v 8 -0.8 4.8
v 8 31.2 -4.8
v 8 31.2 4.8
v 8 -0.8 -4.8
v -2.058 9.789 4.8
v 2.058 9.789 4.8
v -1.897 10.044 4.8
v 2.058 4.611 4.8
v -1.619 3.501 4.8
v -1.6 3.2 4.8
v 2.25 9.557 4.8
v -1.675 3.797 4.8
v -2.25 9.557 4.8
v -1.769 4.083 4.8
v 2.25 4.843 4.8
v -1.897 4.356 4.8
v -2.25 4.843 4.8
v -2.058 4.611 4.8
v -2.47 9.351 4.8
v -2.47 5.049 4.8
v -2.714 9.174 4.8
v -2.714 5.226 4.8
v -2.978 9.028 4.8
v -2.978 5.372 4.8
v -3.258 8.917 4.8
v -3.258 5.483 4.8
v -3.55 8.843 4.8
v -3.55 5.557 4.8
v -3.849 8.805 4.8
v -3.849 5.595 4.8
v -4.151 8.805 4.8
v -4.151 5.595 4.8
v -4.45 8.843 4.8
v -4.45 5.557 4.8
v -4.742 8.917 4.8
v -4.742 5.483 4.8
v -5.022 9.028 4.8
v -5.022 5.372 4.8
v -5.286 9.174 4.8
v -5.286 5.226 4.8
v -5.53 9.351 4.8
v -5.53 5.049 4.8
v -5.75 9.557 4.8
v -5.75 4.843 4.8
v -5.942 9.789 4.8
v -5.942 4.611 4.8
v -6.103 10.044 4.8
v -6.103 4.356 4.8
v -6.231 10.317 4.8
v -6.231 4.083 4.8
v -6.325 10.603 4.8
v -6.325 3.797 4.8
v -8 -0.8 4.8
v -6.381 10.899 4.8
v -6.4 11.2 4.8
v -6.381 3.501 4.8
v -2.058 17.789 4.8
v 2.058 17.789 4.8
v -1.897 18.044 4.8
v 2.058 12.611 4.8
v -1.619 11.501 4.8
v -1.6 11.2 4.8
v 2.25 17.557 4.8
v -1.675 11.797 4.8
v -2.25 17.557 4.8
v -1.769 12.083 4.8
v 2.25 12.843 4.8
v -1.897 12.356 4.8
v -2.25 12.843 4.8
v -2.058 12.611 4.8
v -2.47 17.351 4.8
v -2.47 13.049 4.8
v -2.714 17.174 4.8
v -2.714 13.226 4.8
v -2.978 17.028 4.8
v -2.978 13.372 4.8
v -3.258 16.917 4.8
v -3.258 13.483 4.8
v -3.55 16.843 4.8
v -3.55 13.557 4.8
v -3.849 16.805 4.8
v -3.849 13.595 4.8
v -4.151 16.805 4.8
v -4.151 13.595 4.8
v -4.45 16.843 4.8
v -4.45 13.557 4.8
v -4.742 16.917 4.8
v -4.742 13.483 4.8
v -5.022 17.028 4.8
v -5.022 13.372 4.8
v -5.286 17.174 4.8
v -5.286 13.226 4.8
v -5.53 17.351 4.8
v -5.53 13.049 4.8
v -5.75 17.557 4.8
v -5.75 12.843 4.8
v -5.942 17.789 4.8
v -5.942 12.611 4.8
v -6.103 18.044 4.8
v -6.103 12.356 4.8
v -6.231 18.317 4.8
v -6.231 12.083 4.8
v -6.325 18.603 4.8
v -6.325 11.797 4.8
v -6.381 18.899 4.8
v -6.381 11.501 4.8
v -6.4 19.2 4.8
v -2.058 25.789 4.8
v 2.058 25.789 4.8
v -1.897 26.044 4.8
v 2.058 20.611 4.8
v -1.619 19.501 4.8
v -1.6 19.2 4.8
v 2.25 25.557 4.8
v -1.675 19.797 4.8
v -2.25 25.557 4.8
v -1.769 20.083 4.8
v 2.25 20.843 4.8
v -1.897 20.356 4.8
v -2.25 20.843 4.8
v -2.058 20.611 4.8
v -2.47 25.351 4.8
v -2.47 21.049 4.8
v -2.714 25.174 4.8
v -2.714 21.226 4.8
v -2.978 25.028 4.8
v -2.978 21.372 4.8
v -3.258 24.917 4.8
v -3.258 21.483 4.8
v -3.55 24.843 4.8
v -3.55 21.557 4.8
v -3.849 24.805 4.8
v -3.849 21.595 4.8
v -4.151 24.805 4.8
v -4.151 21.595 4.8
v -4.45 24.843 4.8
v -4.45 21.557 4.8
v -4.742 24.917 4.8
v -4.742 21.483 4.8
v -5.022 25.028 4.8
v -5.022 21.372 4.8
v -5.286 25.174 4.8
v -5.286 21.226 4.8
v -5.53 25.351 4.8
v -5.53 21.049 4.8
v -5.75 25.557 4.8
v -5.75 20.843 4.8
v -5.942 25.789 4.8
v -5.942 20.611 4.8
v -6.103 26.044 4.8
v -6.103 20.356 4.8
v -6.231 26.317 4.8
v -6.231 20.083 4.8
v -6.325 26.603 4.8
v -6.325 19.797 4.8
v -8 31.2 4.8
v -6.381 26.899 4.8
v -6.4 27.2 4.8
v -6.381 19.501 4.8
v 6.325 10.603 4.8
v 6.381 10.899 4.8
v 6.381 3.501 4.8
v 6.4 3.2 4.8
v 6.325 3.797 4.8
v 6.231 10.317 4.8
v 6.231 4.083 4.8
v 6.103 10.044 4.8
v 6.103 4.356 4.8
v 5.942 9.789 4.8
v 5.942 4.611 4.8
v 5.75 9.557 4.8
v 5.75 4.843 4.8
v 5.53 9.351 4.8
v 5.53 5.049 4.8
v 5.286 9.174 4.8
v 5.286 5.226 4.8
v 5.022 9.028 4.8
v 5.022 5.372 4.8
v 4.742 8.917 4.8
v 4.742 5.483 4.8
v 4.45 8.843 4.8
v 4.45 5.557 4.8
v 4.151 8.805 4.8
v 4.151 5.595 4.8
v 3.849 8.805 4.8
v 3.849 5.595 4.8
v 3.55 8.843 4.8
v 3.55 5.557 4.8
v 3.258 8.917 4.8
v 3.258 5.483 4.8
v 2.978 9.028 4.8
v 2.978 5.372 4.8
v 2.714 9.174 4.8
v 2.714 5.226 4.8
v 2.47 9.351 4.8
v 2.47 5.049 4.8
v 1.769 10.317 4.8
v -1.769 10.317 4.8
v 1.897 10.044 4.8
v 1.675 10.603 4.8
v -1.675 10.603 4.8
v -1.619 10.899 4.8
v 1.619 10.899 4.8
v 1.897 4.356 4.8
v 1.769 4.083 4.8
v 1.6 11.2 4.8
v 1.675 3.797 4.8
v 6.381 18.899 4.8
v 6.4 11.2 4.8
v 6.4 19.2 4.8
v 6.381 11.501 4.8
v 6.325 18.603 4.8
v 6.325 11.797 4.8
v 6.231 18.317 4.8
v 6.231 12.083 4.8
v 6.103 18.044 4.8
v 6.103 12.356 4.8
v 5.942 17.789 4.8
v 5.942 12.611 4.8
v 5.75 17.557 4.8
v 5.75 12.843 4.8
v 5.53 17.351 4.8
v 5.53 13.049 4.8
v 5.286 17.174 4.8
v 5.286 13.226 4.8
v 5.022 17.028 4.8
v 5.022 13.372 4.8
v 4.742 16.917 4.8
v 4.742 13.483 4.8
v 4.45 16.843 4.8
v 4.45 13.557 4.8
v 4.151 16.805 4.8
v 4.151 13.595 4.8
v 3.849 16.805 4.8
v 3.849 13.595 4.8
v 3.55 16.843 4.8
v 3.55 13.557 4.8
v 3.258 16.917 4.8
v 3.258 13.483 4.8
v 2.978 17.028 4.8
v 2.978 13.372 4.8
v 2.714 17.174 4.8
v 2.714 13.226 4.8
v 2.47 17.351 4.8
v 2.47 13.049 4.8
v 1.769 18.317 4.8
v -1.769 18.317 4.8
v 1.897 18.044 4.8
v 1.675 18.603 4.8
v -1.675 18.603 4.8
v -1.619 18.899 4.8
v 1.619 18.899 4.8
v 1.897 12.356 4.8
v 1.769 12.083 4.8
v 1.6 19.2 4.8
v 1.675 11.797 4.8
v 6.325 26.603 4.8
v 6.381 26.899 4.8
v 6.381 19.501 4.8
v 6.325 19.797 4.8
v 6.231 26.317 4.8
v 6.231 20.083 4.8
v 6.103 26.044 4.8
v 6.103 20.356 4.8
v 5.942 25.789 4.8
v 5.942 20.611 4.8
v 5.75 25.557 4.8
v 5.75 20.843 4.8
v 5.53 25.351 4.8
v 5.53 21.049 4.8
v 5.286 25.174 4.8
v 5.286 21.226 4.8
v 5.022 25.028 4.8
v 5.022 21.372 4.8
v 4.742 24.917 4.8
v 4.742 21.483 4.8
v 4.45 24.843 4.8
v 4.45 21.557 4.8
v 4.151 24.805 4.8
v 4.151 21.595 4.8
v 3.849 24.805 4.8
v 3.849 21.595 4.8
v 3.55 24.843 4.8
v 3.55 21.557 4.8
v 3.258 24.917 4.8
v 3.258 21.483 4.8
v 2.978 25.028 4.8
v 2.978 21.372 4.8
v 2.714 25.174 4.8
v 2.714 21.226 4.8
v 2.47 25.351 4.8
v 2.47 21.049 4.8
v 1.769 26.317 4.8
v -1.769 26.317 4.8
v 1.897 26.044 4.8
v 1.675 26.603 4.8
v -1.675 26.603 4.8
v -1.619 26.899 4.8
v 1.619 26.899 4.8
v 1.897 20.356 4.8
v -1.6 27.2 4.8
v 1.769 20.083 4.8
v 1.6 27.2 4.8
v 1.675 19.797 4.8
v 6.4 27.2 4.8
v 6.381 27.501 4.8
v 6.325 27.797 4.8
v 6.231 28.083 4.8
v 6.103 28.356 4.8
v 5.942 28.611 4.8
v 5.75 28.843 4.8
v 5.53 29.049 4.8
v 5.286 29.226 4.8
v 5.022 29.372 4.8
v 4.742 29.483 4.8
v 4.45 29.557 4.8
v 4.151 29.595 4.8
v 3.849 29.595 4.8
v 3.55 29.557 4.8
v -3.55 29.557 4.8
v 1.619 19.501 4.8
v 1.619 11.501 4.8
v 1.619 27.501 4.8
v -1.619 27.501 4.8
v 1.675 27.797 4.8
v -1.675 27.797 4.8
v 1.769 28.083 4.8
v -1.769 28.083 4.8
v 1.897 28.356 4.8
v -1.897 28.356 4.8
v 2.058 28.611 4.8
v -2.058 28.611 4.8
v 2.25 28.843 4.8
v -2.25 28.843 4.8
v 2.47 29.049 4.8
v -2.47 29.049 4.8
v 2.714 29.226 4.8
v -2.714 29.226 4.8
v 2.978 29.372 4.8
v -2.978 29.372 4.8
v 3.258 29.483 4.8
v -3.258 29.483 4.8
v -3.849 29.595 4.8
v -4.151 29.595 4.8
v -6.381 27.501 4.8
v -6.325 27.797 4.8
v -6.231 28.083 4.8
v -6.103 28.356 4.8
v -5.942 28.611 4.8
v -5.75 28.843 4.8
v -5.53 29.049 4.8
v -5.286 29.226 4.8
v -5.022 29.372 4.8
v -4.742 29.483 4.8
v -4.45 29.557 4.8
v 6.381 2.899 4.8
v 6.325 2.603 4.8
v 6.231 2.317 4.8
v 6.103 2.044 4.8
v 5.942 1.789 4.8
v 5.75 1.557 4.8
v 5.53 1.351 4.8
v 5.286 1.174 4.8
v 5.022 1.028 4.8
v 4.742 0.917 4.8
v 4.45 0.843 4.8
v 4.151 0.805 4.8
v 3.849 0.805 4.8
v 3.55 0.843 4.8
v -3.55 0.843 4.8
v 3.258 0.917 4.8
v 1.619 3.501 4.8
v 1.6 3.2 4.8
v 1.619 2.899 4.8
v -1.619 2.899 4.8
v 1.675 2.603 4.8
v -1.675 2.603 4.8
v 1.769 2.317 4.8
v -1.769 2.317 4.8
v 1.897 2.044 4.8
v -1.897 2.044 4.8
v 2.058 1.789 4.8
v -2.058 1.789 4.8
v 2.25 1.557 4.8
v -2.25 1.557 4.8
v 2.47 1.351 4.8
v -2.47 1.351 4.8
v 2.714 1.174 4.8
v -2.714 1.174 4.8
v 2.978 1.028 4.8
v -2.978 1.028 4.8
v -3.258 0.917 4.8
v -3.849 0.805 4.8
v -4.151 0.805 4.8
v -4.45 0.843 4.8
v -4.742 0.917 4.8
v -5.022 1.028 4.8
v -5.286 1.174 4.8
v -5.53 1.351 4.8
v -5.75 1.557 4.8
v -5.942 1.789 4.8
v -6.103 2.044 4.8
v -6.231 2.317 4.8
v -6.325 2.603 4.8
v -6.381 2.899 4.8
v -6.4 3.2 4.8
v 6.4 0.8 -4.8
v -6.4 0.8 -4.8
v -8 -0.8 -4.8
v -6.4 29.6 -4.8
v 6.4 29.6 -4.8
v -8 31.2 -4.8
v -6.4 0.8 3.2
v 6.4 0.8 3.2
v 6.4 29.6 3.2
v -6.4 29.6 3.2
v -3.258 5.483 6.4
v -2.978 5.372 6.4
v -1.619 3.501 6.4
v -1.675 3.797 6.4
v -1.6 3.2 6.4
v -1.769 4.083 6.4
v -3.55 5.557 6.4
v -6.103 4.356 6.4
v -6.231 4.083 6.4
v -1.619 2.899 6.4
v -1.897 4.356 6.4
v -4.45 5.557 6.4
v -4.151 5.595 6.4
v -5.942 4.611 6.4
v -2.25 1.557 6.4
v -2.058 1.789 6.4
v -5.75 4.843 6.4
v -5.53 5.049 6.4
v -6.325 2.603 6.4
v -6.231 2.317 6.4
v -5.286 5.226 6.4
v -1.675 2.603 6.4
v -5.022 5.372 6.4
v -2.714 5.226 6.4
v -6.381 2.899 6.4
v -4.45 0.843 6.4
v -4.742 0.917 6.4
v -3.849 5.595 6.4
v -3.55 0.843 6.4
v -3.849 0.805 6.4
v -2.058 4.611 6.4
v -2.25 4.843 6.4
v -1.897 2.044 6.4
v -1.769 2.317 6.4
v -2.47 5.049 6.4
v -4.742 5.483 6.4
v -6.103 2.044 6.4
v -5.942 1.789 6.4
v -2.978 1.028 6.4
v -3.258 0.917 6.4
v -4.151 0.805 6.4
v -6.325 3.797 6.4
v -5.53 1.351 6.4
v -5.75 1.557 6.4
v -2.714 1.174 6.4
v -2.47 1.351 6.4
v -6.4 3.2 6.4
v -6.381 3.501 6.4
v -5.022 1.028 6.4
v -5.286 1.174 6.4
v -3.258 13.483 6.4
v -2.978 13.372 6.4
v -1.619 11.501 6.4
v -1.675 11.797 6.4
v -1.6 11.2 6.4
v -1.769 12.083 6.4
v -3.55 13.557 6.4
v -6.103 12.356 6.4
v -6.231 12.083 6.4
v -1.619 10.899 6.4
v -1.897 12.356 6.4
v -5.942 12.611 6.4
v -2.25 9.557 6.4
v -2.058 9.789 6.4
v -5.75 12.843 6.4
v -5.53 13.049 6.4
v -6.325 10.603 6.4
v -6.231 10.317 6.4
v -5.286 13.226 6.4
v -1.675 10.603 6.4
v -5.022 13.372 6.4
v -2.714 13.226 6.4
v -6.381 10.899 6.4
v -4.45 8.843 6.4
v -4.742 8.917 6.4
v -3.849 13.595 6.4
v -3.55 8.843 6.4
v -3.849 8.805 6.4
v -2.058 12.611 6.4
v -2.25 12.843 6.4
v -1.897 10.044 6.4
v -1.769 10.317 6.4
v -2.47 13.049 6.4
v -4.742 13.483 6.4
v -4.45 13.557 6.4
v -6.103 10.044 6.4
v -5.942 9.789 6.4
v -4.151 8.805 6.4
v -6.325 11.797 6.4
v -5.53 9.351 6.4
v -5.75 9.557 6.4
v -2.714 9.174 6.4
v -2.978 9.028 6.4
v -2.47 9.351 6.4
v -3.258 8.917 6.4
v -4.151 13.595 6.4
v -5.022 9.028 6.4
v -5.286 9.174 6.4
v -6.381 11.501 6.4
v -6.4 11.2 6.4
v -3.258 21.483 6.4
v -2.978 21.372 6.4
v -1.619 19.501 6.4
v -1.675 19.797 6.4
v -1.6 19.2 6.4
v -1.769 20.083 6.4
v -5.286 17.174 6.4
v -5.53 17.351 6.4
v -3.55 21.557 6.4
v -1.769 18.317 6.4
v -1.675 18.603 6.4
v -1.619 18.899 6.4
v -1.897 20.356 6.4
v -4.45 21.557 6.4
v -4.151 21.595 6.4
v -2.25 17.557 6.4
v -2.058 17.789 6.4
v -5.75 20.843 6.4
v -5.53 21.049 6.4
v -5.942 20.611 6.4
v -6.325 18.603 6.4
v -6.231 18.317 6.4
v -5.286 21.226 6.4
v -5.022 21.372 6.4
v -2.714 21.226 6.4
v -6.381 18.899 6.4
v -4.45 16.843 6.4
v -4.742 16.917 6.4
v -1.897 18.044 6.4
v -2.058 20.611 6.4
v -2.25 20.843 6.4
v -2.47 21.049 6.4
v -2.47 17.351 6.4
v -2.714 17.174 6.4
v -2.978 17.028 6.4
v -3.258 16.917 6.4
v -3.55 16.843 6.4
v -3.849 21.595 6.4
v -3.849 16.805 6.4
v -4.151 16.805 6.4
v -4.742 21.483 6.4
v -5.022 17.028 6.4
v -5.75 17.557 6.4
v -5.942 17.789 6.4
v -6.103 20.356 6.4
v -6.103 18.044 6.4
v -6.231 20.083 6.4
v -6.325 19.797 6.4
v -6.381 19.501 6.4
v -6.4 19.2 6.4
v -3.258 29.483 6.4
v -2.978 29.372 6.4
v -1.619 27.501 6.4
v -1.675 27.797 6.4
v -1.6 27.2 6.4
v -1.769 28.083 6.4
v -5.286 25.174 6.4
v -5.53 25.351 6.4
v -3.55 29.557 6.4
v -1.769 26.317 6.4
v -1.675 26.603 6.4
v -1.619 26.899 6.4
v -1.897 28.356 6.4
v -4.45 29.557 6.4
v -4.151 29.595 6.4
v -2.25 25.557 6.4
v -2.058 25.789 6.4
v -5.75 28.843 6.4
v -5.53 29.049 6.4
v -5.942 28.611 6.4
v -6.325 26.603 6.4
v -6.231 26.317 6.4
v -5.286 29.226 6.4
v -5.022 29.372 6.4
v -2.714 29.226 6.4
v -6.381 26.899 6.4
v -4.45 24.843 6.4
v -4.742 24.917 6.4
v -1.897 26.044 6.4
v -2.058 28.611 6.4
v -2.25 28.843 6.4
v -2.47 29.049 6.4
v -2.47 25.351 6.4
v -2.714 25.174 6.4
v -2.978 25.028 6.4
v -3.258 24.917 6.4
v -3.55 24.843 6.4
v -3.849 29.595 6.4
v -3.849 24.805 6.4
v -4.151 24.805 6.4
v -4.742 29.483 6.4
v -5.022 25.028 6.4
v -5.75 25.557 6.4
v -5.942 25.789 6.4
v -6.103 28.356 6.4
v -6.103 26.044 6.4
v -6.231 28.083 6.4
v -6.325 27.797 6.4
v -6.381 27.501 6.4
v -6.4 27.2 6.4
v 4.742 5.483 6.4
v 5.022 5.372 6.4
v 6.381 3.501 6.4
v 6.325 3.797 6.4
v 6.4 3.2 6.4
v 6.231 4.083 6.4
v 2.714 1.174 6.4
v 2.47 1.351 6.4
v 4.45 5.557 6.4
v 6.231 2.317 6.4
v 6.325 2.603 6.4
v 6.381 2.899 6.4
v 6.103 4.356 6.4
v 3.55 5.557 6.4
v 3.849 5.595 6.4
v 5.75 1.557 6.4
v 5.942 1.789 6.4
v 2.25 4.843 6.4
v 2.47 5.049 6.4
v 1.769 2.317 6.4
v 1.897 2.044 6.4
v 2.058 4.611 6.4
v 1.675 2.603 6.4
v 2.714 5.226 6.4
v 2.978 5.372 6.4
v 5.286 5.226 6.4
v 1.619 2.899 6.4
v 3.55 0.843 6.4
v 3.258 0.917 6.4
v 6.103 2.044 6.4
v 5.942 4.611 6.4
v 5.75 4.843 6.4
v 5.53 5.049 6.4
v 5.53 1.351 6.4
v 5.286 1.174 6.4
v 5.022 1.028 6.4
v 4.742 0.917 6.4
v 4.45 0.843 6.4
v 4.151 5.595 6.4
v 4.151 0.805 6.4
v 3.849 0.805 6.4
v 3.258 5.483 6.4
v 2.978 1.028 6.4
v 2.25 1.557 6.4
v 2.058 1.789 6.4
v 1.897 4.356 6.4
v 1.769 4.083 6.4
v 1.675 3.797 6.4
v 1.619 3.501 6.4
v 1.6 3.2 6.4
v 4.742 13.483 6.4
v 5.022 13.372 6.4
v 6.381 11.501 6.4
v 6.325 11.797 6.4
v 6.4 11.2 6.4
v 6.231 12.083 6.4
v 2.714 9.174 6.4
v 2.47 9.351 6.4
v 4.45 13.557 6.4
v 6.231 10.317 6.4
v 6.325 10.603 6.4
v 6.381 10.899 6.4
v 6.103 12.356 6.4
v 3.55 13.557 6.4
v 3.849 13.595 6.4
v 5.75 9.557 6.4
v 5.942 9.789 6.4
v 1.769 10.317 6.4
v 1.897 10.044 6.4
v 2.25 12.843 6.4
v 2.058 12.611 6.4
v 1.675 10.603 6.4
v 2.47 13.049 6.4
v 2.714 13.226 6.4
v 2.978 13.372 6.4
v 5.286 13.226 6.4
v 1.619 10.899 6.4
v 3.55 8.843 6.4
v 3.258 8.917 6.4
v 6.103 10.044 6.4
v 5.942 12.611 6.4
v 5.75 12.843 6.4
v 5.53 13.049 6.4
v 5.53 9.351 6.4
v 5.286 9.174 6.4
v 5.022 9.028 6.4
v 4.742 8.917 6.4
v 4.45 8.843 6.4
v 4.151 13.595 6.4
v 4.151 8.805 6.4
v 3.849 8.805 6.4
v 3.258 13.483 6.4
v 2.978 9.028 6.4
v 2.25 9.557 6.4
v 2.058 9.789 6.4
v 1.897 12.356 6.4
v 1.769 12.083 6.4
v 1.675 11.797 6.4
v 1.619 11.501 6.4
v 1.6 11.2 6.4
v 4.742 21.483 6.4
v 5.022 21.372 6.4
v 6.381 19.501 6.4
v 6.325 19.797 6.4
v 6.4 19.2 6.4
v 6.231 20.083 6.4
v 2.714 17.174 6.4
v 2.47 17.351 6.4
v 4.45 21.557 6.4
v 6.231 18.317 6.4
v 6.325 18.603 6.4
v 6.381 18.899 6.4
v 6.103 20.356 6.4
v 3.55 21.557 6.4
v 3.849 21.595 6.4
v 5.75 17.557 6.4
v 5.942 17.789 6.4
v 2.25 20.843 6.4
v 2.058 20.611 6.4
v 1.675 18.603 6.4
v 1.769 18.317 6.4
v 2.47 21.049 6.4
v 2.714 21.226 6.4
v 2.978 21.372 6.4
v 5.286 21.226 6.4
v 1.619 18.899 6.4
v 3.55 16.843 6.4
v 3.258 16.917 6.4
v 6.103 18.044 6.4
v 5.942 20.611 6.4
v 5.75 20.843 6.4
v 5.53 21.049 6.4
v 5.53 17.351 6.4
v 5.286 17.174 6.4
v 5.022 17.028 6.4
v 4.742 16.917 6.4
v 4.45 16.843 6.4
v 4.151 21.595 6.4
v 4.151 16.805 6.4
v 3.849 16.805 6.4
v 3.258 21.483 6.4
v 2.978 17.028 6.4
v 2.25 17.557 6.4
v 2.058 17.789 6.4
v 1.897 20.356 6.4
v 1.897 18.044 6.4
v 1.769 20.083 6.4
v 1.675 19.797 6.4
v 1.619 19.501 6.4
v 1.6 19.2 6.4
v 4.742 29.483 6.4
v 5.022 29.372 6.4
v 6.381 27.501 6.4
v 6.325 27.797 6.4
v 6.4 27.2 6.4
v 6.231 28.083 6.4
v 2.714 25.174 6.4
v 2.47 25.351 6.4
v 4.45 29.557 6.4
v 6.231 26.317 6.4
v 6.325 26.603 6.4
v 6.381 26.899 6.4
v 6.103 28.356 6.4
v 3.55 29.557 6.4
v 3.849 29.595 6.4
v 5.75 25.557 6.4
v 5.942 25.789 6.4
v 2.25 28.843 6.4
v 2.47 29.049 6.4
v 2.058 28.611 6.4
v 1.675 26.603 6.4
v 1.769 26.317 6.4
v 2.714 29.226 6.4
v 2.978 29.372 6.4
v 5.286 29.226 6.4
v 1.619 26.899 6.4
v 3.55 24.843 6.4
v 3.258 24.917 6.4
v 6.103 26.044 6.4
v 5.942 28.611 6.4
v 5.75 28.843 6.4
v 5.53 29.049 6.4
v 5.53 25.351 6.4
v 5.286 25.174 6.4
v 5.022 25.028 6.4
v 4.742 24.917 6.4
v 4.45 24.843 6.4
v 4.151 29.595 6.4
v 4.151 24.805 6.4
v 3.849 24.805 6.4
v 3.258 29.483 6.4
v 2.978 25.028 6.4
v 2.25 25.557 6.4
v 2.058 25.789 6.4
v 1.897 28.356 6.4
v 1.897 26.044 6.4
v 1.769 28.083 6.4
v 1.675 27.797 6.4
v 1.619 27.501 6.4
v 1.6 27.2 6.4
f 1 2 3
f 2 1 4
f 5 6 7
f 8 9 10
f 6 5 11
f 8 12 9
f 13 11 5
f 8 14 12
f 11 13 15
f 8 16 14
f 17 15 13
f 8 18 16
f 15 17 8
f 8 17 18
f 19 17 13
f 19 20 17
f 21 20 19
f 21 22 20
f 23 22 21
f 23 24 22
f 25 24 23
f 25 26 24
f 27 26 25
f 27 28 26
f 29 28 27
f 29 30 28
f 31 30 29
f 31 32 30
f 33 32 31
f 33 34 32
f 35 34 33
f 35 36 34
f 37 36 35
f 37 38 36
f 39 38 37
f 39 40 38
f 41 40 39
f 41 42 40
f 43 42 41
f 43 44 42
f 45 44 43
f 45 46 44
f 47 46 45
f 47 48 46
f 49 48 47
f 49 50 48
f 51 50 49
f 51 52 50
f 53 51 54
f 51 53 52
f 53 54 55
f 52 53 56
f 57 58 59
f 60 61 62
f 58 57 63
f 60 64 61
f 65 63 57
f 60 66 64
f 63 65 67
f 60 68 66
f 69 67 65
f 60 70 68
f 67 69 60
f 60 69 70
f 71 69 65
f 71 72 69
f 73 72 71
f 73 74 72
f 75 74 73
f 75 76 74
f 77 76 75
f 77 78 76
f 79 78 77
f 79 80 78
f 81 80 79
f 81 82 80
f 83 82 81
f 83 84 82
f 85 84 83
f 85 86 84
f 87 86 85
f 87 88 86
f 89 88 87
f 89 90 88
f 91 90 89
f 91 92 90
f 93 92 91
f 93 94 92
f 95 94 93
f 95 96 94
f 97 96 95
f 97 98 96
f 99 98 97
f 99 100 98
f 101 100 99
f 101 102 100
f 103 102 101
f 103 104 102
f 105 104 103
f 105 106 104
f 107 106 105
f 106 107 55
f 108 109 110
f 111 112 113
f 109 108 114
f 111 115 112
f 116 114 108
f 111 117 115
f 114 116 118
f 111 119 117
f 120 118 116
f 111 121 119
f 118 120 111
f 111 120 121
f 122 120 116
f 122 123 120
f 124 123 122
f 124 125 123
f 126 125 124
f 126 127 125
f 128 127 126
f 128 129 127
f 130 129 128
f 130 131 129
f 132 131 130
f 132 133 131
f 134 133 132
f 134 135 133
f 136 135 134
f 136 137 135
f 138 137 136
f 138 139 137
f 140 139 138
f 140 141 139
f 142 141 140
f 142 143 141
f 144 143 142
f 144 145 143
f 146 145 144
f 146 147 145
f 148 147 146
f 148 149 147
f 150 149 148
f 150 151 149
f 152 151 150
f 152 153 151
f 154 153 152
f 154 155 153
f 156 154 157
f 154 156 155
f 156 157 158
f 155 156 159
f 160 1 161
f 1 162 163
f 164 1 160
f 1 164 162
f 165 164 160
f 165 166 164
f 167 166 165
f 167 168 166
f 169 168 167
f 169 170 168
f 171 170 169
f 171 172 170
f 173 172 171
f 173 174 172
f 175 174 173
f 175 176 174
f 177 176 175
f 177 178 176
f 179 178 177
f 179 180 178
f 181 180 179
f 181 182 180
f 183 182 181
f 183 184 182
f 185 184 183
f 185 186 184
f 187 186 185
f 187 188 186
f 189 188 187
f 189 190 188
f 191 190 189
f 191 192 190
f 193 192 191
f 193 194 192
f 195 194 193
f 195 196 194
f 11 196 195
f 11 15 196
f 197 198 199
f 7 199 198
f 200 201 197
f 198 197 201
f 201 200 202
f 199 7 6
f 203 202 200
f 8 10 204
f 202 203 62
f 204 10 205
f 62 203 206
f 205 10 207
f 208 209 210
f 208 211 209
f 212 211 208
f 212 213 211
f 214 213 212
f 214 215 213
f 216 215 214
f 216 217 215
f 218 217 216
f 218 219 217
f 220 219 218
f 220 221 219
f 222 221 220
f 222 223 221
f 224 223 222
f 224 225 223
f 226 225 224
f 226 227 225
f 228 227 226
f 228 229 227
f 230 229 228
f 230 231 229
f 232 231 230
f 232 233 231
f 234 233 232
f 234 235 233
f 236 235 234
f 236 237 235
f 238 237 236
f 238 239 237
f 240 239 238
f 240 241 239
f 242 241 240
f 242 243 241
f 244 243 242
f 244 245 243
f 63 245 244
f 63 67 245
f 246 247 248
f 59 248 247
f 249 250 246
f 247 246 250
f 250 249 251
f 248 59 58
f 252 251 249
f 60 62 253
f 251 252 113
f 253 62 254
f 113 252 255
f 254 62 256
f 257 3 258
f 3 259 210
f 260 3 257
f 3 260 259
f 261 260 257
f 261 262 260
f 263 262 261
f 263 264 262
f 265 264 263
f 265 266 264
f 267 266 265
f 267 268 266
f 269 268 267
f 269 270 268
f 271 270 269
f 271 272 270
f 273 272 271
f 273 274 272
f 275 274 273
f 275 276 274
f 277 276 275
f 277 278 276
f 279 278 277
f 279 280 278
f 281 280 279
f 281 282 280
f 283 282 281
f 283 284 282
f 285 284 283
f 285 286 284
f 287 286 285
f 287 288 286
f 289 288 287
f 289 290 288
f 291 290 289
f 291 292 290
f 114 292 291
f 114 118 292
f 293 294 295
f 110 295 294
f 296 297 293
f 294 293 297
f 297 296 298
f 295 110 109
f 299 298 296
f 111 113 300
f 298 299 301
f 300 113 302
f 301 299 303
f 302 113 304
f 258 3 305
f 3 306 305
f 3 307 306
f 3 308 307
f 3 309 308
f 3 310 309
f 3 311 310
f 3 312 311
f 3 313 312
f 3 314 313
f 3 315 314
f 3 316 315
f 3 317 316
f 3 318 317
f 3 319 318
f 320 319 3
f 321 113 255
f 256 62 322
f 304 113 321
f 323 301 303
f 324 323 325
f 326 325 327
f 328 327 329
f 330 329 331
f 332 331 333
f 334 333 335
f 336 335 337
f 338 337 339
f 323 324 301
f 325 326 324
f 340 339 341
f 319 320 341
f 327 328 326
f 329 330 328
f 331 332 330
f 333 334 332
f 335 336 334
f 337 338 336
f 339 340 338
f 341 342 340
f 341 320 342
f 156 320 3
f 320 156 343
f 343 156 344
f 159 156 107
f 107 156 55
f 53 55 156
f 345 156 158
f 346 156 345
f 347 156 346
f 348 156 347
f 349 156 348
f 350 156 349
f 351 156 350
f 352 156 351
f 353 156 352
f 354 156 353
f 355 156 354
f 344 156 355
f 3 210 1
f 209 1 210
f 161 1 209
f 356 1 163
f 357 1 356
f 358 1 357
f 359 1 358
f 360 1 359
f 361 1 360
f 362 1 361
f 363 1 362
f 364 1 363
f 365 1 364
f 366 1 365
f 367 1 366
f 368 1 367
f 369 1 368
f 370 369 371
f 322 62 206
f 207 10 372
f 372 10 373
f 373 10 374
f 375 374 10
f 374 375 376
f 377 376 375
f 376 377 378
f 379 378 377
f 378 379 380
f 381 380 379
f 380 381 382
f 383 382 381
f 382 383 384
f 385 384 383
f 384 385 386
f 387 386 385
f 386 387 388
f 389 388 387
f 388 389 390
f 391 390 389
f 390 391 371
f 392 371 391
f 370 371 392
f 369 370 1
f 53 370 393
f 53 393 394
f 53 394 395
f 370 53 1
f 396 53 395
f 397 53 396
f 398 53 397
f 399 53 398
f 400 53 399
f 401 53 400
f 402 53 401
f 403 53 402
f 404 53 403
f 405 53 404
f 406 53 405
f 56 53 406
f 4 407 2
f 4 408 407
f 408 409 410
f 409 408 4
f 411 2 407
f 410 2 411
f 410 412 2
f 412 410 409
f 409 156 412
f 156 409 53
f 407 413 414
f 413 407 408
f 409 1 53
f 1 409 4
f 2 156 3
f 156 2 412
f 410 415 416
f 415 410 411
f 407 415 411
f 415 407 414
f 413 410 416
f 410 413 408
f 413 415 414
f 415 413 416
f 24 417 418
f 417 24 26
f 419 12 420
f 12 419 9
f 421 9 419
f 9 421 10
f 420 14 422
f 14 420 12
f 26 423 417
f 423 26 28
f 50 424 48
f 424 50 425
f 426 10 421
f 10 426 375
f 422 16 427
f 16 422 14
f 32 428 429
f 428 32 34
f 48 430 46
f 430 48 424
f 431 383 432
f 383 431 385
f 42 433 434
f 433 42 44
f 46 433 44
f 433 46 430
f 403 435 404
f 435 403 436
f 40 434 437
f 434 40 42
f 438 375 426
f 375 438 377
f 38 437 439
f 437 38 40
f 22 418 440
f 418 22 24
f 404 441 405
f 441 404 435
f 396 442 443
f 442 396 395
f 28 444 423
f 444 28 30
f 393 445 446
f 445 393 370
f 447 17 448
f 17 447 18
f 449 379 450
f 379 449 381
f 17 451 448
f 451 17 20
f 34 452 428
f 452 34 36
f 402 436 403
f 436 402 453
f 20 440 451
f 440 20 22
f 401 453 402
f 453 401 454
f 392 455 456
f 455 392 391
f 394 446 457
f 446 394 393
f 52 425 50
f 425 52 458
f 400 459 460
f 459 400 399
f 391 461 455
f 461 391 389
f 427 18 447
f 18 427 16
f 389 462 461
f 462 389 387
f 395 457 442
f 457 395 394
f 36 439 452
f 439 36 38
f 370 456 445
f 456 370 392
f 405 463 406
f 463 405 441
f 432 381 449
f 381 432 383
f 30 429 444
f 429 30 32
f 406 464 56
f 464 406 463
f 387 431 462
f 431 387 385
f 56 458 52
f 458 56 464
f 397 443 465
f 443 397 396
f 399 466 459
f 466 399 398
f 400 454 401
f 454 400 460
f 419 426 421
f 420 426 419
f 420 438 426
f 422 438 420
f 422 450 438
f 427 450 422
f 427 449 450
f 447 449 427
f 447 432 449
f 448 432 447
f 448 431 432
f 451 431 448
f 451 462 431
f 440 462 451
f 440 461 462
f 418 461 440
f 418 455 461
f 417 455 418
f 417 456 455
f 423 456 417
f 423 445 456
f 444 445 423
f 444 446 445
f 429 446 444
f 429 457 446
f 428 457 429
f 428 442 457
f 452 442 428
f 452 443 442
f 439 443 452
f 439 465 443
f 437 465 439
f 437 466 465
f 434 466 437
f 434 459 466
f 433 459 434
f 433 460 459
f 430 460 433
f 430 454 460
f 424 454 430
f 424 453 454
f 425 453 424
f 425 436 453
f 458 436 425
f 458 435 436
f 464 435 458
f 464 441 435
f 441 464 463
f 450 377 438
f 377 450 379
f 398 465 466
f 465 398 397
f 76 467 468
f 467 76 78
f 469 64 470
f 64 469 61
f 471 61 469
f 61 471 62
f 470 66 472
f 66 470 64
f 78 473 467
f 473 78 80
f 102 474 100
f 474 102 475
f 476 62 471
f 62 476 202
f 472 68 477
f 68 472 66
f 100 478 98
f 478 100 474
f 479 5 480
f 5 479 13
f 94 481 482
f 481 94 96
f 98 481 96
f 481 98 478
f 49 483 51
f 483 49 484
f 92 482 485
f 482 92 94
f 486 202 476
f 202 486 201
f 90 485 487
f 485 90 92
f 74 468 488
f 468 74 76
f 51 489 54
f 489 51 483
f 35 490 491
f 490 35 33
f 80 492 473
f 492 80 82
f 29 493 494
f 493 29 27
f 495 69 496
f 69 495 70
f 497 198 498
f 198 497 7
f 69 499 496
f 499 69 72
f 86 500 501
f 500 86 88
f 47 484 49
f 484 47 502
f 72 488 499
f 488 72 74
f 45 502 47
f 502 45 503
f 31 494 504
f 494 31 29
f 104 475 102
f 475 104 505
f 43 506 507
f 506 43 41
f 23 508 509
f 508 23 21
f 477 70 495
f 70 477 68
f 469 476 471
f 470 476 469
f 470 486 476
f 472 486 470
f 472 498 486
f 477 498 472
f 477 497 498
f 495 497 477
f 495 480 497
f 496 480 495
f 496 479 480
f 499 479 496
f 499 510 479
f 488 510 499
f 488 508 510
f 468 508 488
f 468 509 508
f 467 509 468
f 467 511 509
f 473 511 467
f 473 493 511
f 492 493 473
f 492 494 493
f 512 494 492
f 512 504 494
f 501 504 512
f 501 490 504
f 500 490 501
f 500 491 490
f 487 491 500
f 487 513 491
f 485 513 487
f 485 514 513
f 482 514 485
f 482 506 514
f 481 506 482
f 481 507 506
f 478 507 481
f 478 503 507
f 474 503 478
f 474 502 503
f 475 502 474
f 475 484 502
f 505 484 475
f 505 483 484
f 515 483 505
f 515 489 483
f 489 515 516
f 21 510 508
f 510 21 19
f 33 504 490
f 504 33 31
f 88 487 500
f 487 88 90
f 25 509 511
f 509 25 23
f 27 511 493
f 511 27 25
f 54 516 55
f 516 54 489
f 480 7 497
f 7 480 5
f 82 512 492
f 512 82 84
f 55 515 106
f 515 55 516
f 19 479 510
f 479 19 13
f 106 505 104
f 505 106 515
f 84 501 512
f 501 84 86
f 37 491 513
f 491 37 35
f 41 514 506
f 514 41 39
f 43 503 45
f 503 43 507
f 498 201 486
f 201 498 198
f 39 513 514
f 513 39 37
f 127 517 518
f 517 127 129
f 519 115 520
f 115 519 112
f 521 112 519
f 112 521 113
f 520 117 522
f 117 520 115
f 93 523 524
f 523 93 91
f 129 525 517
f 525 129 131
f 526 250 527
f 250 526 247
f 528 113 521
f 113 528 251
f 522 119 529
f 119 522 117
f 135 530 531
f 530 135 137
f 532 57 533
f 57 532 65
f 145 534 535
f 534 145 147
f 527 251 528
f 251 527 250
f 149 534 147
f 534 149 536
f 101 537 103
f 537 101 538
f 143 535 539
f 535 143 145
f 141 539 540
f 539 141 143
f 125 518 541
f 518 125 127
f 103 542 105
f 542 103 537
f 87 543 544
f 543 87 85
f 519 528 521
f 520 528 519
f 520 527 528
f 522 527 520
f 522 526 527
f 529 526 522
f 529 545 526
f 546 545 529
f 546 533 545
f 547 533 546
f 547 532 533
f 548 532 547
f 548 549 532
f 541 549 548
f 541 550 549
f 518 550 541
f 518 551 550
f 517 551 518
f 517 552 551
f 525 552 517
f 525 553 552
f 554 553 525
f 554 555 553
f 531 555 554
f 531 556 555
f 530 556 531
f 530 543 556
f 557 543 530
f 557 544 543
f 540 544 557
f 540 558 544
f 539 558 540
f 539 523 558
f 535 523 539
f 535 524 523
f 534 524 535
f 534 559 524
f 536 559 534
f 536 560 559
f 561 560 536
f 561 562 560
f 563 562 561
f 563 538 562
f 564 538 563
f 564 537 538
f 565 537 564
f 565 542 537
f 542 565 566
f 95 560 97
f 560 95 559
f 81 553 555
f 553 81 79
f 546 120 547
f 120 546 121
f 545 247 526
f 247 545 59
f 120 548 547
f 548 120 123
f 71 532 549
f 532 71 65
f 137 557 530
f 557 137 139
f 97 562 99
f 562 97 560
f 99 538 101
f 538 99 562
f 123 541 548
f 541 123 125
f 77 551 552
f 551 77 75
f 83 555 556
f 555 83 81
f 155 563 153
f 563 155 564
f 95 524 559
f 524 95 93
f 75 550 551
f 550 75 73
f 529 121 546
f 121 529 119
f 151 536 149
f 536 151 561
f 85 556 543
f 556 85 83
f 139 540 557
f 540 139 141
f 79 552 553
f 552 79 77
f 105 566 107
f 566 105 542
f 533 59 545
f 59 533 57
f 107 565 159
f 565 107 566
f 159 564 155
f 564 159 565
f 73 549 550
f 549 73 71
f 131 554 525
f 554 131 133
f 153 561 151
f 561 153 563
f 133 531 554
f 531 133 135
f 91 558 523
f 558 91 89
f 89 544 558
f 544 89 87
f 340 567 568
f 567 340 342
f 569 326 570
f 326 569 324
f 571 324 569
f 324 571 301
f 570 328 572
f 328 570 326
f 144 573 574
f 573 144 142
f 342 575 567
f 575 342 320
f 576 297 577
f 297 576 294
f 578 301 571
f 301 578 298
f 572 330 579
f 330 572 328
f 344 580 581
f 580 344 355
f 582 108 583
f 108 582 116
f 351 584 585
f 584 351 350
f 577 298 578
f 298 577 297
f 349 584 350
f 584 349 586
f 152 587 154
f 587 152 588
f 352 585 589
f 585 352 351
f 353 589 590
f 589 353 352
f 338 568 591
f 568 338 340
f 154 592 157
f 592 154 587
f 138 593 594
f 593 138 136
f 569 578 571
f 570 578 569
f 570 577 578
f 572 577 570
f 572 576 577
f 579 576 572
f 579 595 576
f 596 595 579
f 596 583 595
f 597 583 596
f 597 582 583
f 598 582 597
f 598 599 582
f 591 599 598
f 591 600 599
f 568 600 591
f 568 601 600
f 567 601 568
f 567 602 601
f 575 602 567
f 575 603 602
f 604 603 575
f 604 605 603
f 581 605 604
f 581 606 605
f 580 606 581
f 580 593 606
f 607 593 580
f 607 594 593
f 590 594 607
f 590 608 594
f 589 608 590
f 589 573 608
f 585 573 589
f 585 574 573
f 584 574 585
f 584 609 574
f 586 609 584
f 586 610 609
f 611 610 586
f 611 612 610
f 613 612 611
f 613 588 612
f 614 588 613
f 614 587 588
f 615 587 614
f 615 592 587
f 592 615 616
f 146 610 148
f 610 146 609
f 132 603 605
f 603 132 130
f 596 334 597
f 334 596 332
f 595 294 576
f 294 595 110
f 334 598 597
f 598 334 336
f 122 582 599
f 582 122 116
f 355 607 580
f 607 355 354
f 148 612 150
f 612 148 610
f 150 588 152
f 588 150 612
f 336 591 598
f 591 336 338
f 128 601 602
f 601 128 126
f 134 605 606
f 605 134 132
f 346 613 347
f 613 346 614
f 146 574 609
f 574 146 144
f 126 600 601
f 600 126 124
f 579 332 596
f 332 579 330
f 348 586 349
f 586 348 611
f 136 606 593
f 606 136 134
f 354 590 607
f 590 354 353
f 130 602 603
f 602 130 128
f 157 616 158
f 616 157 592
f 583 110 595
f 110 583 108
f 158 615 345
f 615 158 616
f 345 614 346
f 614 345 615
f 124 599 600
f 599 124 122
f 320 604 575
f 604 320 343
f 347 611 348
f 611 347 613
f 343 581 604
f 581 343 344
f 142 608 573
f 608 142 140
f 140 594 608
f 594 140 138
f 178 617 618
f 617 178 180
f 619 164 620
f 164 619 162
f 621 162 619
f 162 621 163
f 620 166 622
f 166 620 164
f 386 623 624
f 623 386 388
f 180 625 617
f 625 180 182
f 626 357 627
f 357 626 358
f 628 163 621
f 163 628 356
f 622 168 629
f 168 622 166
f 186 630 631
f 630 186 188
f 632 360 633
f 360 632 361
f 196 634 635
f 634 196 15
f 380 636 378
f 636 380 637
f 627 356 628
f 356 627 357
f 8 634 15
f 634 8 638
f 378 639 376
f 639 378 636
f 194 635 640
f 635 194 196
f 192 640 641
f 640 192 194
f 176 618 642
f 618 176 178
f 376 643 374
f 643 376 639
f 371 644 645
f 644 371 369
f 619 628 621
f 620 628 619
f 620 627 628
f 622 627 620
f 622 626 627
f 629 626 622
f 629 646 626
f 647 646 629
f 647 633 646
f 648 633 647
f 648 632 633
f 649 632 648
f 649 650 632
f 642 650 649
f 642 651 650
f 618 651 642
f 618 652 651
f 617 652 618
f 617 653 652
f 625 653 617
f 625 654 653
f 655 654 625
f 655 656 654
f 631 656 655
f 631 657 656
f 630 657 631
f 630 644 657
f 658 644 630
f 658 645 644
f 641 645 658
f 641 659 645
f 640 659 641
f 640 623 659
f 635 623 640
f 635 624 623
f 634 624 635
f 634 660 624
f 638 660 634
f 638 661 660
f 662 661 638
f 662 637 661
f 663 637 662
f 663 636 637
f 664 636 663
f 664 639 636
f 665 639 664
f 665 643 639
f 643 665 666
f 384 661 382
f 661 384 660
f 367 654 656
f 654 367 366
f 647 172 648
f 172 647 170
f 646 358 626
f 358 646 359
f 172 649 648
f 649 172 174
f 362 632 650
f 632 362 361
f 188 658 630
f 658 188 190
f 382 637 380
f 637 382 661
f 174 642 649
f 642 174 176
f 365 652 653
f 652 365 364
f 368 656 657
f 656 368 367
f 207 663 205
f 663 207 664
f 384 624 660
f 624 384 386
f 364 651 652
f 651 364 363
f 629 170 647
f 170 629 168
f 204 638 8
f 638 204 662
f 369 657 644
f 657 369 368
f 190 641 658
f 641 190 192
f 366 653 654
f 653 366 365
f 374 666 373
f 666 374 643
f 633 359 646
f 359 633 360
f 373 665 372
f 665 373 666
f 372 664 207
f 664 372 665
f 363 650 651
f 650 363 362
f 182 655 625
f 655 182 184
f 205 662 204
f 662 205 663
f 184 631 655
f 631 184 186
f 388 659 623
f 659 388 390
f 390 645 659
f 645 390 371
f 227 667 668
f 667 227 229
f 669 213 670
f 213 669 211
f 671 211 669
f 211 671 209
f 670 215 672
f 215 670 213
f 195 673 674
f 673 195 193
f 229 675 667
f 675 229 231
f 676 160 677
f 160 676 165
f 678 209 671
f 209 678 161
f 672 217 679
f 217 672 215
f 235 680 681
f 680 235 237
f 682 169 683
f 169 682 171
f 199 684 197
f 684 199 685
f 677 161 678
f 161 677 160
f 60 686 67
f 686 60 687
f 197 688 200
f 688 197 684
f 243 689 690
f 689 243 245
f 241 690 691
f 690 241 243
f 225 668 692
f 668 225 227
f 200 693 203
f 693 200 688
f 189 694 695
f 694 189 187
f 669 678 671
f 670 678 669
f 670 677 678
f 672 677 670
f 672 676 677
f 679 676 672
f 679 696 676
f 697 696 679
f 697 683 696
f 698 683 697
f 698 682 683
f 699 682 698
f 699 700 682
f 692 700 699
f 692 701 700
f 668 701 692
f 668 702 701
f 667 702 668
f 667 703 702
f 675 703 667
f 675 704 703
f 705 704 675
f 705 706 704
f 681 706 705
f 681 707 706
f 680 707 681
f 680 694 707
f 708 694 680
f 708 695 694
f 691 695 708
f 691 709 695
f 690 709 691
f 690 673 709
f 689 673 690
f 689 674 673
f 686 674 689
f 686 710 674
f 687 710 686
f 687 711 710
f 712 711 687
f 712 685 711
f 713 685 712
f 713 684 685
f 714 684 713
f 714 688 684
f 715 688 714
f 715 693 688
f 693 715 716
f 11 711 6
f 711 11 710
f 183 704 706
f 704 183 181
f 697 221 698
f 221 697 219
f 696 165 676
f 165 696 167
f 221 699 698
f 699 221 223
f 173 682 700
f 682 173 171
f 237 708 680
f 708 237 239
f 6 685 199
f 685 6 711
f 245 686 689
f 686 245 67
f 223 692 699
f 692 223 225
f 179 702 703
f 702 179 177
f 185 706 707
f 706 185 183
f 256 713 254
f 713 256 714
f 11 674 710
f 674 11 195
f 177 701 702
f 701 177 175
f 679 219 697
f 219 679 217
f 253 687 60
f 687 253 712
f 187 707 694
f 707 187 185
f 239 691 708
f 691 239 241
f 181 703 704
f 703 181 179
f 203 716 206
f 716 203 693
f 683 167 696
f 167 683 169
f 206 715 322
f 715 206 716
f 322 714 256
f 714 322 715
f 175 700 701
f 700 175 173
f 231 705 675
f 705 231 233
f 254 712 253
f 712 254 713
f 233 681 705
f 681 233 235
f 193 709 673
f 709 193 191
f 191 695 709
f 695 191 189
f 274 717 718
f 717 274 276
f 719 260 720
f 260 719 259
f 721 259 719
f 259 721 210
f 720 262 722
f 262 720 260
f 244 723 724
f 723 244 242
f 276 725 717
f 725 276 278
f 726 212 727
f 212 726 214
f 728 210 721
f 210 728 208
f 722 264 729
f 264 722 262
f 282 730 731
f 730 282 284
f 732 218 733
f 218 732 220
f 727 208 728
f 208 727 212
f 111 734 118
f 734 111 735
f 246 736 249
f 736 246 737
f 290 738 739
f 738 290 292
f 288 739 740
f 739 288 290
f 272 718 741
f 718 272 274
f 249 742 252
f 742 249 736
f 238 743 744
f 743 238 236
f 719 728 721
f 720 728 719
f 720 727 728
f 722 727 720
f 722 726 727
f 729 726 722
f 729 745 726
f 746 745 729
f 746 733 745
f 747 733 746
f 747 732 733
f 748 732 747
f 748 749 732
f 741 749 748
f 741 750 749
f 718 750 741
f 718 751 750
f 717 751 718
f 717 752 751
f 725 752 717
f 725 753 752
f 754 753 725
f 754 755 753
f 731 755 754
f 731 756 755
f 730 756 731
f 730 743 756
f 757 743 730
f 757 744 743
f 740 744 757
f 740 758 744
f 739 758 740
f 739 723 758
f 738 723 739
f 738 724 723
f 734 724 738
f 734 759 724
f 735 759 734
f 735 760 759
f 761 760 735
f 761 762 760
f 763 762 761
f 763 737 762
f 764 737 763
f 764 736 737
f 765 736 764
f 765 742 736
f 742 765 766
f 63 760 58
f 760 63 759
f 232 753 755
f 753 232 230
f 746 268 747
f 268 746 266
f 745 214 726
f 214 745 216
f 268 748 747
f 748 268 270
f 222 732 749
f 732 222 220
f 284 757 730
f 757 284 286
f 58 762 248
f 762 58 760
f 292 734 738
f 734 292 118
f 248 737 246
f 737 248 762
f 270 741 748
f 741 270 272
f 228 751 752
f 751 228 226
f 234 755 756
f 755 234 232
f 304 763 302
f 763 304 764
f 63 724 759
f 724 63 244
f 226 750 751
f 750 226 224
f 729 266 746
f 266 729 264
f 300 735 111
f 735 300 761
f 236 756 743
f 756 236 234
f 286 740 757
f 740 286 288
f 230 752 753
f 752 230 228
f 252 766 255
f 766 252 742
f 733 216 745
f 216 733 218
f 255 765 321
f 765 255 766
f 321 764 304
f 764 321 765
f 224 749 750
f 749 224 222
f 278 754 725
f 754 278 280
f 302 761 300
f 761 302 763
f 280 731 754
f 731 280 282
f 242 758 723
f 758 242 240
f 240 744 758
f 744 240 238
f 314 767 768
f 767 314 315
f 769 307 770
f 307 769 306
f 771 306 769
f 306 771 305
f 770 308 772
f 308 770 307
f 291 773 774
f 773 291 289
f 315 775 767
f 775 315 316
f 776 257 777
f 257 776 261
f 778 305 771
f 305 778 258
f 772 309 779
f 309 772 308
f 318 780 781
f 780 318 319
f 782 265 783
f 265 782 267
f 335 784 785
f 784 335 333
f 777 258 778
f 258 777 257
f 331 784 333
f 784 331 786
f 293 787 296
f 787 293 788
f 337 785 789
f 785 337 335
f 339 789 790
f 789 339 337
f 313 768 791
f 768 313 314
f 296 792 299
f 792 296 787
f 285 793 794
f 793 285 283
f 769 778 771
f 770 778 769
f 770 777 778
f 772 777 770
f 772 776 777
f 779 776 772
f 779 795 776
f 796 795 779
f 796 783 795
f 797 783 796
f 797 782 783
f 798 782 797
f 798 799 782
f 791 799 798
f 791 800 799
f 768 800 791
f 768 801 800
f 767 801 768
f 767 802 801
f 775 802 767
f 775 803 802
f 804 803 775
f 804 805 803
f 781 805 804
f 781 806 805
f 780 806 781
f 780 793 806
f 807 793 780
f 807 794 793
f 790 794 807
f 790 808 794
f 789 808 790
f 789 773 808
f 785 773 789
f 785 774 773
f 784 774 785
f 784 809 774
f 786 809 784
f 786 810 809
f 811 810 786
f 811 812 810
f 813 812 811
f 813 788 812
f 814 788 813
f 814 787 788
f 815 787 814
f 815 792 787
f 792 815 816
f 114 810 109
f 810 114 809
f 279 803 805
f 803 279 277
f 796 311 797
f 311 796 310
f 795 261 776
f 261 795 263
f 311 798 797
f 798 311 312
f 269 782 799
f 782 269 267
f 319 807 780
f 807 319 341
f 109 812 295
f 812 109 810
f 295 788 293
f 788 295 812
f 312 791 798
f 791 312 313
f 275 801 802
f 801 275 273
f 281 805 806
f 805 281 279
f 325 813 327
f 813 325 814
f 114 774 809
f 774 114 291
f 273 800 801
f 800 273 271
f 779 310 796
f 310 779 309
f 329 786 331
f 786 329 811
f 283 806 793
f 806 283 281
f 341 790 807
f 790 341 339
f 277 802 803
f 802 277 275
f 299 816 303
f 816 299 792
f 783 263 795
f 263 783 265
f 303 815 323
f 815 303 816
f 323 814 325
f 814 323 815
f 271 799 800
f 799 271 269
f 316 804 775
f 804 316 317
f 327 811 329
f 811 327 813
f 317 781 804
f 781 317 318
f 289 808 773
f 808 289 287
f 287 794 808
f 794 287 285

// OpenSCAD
$fn = 50;

l = 2;
w = 4;

units = 1.6;
stud_distance = 8;
stud_height = units;
stud_radius = units * 1.5;
brick_height = 6 * units;
tolerance = units;

function pythagoras(c1, c2) = sqrt(pow(c1, 2) + pow(c2, 2));

module generate_walls(l, w) {
    brick_length = l * stud_distance;
    brick_width = w * stud_distance;
    union() {
        cube([brick_length, units, brick_height], center=true);
        translate([0, brick_width-units, 0]) cube([brick_length, units, brick_height], center=true);
        translate([brick_length/2 - units/2, brick_width/2 - (units/2), 0]) cube([units, brick_width, brick_height], center=true);
        translate([-brick_length/2 + units/2, brick_width/2 - (units/2), 0]) cube([units, brick_width, brick_height], center=true);
        translate([0, brick_width/2 - (units/2), brick_height/2 - (units/2)]) cube([brick_length, brick_width, units], center=true);
    };
}

module studs(l, w) {
    brick_length = l * stud_distance;
    vectors = [
        for (i = [0:l-1]) for (j = [0:w-1]) [(i * stud_distance) - (brick_length/2) + (2.5*units), (j * stud_distance) + (2*units), units*3.5],
    ];
    //echo(vectors);
    for (stud_location = vectors) {
        translate (stud_location) cylinder(h=stud_height, r=stud_radius, center=true);
    }
}

union() {
    generate_walls(l, w);
    studs(l, w);
    // just need cylinder generation
}
